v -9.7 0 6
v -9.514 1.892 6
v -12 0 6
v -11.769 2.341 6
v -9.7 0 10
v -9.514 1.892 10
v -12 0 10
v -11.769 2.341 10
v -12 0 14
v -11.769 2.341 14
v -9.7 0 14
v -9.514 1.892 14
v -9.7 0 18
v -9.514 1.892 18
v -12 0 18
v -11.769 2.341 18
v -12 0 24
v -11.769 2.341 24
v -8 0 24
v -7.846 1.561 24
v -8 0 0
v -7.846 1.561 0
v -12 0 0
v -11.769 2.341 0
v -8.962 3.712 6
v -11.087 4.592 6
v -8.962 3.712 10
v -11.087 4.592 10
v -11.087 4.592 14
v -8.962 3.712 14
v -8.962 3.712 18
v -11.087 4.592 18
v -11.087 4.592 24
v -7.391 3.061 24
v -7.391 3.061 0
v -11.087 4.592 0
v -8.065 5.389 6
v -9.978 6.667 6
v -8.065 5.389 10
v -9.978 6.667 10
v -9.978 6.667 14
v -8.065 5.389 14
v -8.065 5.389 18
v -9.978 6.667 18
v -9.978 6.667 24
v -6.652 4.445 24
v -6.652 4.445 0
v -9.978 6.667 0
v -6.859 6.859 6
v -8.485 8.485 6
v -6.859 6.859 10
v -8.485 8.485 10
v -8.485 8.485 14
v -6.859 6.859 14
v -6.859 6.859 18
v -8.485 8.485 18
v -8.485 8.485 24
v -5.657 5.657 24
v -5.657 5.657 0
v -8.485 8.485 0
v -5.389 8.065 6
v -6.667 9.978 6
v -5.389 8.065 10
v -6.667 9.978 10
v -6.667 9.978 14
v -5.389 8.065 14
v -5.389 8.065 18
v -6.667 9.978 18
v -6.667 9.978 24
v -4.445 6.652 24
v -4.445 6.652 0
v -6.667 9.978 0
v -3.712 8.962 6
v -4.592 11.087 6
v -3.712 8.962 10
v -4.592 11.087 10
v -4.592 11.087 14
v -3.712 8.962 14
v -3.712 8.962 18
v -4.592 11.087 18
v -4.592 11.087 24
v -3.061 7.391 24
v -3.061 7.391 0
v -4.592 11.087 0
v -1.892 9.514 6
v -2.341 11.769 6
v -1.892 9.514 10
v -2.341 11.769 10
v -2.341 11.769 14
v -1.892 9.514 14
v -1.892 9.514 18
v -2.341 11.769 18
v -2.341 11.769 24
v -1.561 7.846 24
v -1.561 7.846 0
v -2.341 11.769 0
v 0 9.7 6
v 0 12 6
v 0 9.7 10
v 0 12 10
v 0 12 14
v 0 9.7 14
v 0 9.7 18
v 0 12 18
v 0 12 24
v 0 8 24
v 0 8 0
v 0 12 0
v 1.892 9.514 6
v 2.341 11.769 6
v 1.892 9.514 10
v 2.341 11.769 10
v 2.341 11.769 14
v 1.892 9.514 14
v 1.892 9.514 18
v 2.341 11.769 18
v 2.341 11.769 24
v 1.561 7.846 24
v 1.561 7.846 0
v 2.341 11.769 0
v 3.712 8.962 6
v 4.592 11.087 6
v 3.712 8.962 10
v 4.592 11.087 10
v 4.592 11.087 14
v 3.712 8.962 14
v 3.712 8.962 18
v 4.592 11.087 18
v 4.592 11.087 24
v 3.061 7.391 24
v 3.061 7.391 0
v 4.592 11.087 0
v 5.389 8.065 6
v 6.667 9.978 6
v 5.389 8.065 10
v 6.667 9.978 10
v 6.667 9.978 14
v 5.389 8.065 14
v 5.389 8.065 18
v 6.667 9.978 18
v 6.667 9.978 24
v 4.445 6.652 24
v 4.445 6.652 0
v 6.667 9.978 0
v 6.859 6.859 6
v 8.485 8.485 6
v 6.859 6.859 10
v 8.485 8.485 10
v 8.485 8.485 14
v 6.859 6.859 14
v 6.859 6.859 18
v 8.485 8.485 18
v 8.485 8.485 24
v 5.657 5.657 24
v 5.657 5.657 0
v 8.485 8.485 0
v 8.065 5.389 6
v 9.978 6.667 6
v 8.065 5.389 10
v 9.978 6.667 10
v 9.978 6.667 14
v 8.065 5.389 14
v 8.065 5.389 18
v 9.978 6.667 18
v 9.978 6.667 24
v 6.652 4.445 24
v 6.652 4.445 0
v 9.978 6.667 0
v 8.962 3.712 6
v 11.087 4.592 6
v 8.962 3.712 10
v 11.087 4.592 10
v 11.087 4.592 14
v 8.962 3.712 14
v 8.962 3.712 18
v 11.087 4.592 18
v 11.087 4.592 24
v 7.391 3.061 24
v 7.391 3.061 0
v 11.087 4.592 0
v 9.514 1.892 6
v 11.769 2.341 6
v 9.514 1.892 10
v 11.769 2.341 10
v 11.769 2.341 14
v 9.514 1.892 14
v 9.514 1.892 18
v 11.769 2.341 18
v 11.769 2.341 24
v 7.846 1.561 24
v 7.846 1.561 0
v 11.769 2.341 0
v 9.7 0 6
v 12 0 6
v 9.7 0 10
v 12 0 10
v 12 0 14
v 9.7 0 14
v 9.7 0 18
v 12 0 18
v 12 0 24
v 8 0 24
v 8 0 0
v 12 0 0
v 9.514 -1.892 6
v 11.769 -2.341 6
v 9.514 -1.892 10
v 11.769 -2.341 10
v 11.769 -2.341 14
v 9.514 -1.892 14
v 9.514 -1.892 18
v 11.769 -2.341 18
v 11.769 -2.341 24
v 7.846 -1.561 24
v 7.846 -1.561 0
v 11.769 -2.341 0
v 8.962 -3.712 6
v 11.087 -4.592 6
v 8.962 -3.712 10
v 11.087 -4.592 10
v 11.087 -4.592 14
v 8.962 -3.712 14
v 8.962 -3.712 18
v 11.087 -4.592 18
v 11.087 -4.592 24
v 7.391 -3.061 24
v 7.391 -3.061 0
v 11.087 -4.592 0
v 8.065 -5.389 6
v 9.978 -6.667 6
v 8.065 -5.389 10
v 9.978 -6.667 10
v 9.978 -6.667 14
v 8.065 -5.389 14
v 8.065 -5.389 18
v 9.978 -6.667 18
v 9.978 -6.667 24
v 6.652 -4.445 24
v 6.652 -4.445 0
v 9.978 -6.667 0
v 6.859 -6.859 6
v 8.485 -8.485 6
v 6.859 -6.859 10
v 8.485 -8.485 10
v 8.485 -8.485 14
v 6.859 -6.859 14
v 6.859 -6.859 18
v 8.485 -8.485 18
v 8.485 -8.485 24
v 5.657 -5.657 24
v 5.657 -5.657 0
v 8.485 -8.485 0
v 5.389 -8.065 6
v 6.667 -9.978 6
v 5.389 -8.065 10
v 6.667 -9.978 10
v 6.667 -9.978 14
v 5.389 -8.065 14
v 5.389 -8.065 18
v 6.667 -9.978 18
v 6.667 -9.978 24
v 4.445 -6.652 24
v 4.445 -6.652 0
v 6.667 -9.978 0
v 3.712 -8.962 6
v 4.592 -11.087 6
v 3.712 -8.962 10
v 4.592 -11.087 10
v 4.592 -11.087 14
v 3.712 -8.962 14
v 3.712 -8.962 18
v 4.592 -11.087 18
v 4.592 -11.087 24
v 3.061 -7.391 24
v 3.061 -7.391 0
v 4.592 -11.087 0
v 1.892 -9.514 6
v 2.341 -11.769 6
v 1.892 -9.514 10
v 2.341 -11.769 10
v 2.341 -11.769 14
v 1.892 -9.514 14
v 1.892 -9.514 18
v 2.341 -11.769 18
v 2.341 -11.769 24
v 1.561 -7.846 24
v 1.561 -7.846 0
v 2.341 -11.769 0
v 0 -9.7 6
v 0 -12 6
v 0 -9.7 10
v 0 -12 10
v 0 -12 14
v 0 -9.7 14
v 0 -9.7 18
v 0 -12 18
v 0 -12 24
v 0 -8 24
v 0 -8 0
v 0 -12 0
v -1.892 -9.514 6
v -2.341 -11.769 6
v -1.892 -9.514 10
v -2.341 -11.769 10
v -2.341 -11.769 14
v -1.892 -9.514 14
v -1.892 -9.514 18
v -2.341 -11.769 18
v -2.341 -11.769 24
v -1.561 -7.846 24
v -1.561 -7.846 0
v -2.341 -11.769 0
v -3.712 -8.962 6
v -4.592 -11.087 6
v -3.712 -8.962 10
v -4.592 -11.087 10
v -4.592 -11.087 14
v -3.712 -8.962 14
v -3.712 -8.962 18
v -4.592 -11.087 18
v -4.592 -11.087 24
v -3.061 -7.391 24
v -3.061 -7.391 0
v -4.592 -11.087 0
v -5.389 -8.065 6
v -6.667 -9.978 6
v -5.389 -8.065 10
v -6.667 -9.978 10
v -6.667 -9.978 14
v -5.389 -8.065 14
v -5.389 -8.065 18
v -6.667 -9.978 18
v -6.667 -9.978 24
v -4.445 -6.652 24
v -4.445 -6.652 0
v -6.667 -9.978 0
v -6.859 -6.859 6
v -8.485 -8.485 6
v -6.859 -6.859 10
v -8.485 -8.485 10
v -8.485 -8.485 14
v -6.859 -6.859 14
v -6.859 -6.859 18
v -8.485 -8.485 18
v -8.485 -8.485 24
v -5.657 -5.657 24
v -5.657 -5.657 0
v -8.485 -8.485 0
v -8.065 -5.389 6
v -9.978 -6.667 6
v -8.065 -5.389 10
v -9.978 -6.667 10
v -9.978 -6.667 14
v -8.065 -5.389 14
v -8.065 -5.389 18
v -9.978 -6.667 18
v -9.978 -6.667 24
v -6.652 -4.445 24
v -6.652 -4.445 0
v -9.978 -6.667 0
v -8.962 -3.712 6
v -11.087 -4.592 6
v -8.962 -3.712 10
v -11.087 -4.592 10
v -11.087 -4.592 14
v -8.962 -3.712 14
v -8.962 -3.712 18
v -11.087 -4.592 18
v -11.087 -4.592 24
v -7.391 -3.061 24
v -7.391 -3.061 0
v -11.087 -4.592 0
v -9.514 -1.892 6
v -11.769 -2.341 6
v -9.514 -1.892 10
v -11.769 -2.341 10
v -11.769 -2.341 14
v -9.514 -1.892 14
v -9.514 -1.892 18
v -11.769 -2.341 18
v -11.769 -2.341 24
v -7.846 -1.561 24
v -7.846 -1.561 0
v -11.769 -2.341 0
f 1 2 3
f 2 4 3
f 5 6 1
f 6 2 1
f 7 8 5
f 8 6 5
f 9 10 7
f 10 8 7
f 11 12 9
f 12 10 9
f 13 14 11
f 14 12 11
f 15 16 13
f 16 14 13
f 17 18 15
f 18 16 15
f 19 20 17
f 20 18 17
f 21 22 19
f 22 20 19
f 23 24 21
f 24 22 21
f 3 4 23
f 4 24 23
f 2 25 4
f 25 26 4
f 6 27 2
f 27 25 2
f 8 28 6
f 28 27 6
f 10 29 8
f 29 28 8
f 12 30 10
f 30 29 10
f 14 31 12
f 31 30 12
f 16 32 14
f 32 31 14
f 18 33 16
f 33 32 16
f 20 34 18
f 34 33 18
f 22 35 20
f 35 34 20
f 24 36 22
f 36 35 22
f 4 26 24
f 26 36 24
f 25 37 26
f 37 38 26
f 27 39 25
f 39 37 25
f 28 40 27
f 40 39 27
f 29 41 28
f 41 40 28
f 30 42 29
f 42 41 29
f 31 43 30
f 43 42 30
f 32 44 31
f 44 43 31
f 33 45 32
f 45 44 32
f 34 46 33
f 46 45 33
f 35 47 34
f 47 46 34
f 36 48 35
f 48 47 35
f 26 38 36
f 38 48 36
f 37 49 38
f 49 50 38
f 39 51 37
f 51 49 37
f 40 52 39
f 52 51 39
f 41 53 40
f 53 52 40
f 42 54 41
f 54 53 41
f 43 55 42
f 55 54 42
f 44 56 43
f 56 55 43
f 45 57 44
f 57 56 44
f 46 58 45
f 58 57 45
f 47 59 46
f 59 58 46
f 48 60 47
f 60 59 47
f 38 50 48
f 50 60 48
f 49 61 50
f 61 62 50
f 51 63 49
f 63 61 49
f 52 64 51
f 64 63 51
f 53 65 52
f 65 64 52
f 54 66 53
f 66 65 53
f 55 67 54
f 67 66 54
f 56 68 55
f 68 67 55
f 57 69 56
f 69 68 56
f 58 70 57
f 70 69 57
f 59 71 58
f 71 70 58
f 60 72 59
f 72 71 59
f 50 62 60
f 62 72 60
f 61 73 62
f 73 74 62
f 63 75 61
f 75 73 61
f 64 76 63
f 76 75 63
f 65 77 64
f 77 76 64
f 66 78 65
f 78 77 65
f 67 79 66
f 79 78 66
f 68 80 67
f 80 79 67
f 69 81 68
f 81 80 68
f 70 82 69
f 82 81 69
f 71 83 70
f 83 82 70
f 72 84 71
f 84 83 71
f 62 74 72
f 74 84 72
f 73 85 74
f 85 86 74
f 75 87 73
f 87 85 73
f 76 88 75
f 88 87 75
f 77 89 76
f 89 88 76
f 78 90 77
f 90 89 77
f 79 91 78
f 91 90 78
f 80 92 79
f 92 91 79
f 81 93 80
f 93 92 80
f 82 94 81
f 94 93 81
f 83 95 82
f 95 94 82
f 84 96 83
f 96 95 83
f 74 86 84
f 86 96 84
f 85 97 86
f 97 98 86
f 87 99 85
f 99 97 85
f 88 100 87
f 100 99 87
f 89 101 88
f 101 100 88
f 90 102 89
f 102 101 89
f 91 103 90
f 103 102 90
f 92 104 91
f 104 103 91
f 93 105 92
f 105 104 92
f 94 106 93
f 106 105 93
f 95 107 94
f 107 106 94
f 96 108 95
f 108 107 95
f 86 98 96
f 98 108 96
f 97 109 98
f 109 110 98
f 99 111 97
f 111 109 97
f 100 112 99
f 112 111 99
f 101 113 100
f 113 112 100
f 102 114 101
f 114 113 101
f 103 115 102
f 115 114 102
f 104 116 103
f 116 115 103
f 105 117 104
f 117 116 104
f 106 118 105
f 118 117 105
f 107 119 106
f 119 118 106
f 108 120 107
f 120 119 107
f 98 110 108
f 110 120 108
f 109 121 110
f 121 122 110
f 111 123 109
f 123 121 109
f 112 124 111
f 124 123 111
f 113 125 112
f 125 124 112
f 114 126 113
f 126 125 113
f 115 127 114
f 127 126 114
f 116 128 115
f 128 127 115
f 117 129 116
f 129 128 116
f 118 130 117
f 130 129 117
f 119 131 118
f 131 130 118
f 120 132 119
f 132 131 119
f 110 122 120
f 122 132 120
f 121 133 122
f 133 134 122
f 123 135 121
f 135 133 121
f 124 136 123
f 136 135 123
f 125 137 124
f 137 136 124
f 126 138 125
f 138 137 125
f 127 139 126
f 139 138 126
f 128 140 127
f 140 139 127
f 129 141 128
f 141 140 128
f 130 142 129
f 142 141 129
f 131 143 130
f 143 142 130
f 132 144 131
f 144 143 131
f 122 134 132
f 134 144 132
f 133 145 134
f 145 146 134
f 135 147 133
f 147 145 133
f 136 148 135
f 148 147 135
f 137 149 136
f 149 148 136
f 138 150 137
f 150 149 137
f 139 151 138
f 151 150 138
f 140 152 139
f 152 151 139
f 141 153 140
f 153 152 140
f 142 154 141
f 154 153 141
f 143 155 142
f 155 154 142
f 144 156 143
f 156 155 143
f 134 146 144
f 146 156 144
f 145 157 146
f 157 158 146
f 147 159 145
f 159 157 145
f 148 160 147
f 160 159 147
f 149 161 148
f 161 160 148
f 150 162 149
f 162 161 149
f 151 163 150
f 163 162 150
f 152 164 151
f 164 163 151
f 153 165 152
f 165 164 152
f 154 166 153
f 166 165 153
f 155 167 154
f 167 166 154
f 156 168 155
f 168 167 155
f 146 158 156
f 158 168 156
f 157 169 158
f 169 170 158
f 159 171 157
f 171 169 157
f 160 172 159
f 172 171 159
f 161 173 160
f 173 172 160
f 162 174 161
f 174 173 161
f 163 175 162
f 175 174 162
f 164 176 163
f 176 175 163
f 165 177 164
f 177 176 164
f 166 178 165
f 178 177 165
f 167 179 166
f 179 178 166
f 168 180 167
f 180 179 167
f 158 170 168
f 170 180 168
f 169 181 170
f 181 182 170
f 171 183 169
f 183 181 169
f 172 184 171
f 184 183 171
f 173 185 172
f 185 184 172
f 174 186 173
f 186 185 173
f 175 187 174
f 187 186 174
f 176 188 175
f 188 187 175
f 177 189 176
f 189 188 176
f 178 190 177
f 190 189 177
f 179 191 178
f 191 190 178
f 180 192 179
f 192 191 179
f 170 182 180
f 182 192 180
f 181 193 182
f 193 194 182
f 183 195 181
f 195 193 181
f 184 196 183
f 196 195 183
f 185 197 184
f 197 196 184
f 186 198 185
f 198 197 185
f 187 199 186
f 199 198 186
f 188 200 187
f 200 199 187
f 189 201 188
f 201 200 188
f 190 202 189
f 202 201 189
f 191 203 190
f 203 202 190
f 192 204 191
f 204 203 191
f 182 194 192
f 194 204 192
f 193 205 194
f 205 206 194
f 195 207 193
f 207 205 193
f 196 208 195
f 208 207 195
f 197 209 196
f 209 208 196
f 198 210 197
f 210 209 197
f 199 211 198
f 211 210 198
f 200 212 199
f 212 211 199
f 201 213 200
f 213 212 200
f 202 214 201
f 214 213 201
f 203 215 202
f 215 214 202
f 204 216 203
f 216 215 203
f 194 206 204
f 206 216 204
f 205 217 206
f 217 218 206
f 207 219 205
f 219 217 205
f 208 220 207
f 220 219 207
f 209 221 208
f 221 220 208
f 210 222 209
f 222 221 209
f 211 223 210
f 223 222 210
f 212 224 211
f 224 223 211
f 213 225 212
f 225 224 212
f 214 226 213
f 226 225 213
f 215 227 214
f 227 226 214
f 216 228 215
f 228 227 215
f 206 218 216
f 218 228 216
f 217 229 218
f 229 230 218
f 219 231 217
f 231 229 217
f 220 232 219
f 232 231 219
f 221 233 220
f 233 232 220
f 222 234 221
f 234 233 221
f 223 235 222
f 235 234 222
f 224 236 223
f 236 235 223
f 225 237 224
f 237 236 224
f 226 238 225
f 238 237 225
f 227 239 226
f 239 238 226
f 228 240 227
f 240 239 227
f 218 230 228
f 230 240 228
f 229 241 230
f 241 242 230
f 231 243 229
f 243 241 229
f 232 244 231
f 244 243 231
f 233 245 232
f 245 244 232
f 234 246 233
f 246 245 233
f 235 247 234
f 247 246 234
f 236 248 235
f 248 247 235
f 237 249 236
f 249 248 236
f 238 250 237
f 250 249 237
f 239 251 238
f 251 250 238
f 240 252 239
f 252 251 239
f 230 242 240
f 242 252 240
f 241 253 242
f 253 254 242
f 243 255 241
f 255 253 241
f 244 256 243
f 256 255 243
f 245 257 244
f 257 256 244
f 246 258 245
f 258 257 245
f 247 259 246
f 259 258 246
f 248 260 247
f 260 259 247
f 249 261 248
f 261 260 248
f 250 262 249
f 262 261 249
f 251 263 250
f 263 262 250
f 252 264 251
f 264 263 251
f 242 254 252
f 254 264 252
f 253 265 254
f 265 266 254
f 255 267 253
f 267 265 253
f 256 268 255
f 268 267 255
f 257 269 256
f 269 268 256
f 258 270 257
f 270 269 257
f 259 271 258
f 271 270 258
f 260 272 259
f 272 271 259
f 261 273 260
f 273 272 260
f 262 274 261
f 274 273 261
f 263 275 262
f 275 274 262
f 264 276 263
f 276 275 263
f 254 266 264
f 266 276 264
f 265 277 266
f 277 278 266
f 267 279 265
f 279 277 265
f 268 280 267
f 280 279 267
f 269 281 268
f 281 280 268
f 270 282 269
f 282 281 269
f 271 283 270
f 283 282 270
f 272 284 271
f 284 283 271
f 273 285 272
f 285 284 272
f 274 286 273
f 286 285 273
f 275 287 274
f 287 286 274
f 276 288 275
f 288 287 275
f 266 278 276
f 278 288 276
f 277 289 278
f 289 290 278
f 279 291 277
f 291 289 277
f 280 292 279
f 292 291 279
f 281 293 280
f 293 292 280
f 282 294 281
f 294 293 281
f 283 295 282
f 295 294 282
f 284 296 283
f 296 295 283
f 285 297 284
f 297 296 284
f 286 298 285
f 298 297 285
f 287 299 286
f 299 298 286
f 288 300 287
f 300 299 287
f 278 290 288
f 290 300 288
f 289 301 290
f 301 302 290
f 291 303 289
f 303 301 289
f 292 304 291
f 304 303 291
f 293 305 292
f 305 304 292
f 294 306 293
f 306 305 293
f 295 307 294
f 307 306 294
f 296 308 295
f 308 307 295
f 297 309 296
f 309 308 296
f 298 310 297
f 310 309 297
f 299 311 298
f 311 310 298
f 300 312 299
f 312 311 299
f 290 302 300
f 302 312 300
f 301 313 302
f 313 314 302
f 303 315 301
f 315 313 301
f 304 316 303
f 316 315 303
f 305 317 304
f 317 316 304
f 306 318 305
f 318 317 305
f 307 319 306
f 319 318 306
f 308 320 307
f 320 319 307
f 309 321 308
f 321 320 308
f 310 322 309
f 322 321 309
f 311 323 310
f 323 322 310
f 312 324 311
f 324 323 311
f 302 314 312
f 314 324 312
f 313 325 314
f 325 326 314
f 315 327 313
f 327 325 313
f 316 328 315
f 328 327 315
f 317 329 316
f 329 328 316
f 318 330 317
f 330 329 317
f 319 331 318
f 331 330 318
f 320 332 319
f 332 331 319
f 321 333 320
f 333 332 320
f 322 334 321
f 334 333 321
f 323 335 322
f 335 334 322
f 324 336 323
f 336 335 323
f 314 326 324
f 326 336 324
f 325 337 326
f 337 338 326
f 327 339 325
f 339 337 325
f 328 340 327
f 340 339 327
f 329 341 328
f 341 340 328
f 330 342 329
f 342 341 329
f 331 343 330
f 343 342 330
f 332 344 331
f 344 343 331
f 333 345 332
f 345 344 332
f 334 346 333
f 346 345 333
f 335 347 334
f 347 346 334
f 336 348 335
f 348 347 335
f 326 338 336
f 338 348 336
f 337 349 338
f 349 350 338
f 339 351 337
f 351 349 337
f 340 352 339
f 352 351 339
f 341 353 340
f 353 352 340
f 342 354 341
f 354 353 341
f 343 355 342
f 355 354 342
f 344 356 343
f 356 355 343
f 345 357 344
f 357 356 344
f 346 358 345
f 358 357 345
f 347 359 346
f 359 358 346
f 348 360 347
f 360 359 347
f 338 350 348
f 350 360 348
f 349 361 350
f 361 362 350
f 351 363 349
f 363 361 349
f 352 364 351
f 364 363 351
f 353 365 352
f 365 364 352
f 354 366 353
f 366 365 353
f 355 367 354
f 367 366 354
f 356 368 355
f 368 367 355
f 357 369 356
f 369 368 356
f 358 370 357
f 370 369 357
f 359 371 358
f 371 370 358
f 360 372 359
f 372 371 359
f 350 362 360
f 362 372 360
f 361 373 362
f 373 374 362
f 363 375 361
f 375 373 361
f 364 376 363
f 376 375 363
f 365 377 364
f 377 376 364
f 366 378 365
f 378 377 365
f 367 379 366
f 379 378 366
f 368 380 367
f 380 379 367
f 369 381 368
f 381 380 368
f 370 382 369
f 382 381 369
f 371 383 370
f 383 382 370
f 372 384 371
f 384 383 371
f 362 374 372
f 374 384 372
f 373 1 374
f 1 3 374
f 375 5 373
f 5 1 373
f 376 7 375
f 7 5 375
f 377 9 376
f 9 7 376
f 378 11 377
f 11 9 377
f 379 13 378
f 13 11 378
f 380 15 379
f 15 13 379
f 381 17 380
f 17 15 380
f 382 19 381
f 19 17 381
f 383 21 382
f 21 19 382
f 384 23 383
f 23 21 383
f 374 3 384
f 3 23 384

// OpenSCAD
$fn = 32;

// ----------------------------------------------------------------------
// Grooved revolve: plain_grooves, bore R8
// ----------------------------------------------------------------------

// --- parameters (mm) ---
bore_r = 8;               // bore radius
outer_r = 12;             // outer radius of the body
total_h = 24;             // overall height, Z
wall = 4;                 // radial wall thickness
groove_w = 4;             // groove width
groove_d = 2.3;           // groove depth
grooves = 2;              // number of outer grooves

bbox_x = 2 * outer_r;  // full diameter
bore_d = 2 * bore_r;  // bore diameter
body_d = 2 * outer_r;  // body diameter
revolve_angle = 360;  // full turn around the Z axis

profile = [[8, 0], [12, 0], [12, 6], [9.7, 6], [9.7, 10], [12, 10], [12, 14], [9.7, 14], [9.7, 18], [12, 18], [12, 24], [8, 24]];  // primary outline, 12 points, counter clockwise

// --- the one profile operation ---
rotate_extrude(angle = revolve_angle) polygon(points = profile);
